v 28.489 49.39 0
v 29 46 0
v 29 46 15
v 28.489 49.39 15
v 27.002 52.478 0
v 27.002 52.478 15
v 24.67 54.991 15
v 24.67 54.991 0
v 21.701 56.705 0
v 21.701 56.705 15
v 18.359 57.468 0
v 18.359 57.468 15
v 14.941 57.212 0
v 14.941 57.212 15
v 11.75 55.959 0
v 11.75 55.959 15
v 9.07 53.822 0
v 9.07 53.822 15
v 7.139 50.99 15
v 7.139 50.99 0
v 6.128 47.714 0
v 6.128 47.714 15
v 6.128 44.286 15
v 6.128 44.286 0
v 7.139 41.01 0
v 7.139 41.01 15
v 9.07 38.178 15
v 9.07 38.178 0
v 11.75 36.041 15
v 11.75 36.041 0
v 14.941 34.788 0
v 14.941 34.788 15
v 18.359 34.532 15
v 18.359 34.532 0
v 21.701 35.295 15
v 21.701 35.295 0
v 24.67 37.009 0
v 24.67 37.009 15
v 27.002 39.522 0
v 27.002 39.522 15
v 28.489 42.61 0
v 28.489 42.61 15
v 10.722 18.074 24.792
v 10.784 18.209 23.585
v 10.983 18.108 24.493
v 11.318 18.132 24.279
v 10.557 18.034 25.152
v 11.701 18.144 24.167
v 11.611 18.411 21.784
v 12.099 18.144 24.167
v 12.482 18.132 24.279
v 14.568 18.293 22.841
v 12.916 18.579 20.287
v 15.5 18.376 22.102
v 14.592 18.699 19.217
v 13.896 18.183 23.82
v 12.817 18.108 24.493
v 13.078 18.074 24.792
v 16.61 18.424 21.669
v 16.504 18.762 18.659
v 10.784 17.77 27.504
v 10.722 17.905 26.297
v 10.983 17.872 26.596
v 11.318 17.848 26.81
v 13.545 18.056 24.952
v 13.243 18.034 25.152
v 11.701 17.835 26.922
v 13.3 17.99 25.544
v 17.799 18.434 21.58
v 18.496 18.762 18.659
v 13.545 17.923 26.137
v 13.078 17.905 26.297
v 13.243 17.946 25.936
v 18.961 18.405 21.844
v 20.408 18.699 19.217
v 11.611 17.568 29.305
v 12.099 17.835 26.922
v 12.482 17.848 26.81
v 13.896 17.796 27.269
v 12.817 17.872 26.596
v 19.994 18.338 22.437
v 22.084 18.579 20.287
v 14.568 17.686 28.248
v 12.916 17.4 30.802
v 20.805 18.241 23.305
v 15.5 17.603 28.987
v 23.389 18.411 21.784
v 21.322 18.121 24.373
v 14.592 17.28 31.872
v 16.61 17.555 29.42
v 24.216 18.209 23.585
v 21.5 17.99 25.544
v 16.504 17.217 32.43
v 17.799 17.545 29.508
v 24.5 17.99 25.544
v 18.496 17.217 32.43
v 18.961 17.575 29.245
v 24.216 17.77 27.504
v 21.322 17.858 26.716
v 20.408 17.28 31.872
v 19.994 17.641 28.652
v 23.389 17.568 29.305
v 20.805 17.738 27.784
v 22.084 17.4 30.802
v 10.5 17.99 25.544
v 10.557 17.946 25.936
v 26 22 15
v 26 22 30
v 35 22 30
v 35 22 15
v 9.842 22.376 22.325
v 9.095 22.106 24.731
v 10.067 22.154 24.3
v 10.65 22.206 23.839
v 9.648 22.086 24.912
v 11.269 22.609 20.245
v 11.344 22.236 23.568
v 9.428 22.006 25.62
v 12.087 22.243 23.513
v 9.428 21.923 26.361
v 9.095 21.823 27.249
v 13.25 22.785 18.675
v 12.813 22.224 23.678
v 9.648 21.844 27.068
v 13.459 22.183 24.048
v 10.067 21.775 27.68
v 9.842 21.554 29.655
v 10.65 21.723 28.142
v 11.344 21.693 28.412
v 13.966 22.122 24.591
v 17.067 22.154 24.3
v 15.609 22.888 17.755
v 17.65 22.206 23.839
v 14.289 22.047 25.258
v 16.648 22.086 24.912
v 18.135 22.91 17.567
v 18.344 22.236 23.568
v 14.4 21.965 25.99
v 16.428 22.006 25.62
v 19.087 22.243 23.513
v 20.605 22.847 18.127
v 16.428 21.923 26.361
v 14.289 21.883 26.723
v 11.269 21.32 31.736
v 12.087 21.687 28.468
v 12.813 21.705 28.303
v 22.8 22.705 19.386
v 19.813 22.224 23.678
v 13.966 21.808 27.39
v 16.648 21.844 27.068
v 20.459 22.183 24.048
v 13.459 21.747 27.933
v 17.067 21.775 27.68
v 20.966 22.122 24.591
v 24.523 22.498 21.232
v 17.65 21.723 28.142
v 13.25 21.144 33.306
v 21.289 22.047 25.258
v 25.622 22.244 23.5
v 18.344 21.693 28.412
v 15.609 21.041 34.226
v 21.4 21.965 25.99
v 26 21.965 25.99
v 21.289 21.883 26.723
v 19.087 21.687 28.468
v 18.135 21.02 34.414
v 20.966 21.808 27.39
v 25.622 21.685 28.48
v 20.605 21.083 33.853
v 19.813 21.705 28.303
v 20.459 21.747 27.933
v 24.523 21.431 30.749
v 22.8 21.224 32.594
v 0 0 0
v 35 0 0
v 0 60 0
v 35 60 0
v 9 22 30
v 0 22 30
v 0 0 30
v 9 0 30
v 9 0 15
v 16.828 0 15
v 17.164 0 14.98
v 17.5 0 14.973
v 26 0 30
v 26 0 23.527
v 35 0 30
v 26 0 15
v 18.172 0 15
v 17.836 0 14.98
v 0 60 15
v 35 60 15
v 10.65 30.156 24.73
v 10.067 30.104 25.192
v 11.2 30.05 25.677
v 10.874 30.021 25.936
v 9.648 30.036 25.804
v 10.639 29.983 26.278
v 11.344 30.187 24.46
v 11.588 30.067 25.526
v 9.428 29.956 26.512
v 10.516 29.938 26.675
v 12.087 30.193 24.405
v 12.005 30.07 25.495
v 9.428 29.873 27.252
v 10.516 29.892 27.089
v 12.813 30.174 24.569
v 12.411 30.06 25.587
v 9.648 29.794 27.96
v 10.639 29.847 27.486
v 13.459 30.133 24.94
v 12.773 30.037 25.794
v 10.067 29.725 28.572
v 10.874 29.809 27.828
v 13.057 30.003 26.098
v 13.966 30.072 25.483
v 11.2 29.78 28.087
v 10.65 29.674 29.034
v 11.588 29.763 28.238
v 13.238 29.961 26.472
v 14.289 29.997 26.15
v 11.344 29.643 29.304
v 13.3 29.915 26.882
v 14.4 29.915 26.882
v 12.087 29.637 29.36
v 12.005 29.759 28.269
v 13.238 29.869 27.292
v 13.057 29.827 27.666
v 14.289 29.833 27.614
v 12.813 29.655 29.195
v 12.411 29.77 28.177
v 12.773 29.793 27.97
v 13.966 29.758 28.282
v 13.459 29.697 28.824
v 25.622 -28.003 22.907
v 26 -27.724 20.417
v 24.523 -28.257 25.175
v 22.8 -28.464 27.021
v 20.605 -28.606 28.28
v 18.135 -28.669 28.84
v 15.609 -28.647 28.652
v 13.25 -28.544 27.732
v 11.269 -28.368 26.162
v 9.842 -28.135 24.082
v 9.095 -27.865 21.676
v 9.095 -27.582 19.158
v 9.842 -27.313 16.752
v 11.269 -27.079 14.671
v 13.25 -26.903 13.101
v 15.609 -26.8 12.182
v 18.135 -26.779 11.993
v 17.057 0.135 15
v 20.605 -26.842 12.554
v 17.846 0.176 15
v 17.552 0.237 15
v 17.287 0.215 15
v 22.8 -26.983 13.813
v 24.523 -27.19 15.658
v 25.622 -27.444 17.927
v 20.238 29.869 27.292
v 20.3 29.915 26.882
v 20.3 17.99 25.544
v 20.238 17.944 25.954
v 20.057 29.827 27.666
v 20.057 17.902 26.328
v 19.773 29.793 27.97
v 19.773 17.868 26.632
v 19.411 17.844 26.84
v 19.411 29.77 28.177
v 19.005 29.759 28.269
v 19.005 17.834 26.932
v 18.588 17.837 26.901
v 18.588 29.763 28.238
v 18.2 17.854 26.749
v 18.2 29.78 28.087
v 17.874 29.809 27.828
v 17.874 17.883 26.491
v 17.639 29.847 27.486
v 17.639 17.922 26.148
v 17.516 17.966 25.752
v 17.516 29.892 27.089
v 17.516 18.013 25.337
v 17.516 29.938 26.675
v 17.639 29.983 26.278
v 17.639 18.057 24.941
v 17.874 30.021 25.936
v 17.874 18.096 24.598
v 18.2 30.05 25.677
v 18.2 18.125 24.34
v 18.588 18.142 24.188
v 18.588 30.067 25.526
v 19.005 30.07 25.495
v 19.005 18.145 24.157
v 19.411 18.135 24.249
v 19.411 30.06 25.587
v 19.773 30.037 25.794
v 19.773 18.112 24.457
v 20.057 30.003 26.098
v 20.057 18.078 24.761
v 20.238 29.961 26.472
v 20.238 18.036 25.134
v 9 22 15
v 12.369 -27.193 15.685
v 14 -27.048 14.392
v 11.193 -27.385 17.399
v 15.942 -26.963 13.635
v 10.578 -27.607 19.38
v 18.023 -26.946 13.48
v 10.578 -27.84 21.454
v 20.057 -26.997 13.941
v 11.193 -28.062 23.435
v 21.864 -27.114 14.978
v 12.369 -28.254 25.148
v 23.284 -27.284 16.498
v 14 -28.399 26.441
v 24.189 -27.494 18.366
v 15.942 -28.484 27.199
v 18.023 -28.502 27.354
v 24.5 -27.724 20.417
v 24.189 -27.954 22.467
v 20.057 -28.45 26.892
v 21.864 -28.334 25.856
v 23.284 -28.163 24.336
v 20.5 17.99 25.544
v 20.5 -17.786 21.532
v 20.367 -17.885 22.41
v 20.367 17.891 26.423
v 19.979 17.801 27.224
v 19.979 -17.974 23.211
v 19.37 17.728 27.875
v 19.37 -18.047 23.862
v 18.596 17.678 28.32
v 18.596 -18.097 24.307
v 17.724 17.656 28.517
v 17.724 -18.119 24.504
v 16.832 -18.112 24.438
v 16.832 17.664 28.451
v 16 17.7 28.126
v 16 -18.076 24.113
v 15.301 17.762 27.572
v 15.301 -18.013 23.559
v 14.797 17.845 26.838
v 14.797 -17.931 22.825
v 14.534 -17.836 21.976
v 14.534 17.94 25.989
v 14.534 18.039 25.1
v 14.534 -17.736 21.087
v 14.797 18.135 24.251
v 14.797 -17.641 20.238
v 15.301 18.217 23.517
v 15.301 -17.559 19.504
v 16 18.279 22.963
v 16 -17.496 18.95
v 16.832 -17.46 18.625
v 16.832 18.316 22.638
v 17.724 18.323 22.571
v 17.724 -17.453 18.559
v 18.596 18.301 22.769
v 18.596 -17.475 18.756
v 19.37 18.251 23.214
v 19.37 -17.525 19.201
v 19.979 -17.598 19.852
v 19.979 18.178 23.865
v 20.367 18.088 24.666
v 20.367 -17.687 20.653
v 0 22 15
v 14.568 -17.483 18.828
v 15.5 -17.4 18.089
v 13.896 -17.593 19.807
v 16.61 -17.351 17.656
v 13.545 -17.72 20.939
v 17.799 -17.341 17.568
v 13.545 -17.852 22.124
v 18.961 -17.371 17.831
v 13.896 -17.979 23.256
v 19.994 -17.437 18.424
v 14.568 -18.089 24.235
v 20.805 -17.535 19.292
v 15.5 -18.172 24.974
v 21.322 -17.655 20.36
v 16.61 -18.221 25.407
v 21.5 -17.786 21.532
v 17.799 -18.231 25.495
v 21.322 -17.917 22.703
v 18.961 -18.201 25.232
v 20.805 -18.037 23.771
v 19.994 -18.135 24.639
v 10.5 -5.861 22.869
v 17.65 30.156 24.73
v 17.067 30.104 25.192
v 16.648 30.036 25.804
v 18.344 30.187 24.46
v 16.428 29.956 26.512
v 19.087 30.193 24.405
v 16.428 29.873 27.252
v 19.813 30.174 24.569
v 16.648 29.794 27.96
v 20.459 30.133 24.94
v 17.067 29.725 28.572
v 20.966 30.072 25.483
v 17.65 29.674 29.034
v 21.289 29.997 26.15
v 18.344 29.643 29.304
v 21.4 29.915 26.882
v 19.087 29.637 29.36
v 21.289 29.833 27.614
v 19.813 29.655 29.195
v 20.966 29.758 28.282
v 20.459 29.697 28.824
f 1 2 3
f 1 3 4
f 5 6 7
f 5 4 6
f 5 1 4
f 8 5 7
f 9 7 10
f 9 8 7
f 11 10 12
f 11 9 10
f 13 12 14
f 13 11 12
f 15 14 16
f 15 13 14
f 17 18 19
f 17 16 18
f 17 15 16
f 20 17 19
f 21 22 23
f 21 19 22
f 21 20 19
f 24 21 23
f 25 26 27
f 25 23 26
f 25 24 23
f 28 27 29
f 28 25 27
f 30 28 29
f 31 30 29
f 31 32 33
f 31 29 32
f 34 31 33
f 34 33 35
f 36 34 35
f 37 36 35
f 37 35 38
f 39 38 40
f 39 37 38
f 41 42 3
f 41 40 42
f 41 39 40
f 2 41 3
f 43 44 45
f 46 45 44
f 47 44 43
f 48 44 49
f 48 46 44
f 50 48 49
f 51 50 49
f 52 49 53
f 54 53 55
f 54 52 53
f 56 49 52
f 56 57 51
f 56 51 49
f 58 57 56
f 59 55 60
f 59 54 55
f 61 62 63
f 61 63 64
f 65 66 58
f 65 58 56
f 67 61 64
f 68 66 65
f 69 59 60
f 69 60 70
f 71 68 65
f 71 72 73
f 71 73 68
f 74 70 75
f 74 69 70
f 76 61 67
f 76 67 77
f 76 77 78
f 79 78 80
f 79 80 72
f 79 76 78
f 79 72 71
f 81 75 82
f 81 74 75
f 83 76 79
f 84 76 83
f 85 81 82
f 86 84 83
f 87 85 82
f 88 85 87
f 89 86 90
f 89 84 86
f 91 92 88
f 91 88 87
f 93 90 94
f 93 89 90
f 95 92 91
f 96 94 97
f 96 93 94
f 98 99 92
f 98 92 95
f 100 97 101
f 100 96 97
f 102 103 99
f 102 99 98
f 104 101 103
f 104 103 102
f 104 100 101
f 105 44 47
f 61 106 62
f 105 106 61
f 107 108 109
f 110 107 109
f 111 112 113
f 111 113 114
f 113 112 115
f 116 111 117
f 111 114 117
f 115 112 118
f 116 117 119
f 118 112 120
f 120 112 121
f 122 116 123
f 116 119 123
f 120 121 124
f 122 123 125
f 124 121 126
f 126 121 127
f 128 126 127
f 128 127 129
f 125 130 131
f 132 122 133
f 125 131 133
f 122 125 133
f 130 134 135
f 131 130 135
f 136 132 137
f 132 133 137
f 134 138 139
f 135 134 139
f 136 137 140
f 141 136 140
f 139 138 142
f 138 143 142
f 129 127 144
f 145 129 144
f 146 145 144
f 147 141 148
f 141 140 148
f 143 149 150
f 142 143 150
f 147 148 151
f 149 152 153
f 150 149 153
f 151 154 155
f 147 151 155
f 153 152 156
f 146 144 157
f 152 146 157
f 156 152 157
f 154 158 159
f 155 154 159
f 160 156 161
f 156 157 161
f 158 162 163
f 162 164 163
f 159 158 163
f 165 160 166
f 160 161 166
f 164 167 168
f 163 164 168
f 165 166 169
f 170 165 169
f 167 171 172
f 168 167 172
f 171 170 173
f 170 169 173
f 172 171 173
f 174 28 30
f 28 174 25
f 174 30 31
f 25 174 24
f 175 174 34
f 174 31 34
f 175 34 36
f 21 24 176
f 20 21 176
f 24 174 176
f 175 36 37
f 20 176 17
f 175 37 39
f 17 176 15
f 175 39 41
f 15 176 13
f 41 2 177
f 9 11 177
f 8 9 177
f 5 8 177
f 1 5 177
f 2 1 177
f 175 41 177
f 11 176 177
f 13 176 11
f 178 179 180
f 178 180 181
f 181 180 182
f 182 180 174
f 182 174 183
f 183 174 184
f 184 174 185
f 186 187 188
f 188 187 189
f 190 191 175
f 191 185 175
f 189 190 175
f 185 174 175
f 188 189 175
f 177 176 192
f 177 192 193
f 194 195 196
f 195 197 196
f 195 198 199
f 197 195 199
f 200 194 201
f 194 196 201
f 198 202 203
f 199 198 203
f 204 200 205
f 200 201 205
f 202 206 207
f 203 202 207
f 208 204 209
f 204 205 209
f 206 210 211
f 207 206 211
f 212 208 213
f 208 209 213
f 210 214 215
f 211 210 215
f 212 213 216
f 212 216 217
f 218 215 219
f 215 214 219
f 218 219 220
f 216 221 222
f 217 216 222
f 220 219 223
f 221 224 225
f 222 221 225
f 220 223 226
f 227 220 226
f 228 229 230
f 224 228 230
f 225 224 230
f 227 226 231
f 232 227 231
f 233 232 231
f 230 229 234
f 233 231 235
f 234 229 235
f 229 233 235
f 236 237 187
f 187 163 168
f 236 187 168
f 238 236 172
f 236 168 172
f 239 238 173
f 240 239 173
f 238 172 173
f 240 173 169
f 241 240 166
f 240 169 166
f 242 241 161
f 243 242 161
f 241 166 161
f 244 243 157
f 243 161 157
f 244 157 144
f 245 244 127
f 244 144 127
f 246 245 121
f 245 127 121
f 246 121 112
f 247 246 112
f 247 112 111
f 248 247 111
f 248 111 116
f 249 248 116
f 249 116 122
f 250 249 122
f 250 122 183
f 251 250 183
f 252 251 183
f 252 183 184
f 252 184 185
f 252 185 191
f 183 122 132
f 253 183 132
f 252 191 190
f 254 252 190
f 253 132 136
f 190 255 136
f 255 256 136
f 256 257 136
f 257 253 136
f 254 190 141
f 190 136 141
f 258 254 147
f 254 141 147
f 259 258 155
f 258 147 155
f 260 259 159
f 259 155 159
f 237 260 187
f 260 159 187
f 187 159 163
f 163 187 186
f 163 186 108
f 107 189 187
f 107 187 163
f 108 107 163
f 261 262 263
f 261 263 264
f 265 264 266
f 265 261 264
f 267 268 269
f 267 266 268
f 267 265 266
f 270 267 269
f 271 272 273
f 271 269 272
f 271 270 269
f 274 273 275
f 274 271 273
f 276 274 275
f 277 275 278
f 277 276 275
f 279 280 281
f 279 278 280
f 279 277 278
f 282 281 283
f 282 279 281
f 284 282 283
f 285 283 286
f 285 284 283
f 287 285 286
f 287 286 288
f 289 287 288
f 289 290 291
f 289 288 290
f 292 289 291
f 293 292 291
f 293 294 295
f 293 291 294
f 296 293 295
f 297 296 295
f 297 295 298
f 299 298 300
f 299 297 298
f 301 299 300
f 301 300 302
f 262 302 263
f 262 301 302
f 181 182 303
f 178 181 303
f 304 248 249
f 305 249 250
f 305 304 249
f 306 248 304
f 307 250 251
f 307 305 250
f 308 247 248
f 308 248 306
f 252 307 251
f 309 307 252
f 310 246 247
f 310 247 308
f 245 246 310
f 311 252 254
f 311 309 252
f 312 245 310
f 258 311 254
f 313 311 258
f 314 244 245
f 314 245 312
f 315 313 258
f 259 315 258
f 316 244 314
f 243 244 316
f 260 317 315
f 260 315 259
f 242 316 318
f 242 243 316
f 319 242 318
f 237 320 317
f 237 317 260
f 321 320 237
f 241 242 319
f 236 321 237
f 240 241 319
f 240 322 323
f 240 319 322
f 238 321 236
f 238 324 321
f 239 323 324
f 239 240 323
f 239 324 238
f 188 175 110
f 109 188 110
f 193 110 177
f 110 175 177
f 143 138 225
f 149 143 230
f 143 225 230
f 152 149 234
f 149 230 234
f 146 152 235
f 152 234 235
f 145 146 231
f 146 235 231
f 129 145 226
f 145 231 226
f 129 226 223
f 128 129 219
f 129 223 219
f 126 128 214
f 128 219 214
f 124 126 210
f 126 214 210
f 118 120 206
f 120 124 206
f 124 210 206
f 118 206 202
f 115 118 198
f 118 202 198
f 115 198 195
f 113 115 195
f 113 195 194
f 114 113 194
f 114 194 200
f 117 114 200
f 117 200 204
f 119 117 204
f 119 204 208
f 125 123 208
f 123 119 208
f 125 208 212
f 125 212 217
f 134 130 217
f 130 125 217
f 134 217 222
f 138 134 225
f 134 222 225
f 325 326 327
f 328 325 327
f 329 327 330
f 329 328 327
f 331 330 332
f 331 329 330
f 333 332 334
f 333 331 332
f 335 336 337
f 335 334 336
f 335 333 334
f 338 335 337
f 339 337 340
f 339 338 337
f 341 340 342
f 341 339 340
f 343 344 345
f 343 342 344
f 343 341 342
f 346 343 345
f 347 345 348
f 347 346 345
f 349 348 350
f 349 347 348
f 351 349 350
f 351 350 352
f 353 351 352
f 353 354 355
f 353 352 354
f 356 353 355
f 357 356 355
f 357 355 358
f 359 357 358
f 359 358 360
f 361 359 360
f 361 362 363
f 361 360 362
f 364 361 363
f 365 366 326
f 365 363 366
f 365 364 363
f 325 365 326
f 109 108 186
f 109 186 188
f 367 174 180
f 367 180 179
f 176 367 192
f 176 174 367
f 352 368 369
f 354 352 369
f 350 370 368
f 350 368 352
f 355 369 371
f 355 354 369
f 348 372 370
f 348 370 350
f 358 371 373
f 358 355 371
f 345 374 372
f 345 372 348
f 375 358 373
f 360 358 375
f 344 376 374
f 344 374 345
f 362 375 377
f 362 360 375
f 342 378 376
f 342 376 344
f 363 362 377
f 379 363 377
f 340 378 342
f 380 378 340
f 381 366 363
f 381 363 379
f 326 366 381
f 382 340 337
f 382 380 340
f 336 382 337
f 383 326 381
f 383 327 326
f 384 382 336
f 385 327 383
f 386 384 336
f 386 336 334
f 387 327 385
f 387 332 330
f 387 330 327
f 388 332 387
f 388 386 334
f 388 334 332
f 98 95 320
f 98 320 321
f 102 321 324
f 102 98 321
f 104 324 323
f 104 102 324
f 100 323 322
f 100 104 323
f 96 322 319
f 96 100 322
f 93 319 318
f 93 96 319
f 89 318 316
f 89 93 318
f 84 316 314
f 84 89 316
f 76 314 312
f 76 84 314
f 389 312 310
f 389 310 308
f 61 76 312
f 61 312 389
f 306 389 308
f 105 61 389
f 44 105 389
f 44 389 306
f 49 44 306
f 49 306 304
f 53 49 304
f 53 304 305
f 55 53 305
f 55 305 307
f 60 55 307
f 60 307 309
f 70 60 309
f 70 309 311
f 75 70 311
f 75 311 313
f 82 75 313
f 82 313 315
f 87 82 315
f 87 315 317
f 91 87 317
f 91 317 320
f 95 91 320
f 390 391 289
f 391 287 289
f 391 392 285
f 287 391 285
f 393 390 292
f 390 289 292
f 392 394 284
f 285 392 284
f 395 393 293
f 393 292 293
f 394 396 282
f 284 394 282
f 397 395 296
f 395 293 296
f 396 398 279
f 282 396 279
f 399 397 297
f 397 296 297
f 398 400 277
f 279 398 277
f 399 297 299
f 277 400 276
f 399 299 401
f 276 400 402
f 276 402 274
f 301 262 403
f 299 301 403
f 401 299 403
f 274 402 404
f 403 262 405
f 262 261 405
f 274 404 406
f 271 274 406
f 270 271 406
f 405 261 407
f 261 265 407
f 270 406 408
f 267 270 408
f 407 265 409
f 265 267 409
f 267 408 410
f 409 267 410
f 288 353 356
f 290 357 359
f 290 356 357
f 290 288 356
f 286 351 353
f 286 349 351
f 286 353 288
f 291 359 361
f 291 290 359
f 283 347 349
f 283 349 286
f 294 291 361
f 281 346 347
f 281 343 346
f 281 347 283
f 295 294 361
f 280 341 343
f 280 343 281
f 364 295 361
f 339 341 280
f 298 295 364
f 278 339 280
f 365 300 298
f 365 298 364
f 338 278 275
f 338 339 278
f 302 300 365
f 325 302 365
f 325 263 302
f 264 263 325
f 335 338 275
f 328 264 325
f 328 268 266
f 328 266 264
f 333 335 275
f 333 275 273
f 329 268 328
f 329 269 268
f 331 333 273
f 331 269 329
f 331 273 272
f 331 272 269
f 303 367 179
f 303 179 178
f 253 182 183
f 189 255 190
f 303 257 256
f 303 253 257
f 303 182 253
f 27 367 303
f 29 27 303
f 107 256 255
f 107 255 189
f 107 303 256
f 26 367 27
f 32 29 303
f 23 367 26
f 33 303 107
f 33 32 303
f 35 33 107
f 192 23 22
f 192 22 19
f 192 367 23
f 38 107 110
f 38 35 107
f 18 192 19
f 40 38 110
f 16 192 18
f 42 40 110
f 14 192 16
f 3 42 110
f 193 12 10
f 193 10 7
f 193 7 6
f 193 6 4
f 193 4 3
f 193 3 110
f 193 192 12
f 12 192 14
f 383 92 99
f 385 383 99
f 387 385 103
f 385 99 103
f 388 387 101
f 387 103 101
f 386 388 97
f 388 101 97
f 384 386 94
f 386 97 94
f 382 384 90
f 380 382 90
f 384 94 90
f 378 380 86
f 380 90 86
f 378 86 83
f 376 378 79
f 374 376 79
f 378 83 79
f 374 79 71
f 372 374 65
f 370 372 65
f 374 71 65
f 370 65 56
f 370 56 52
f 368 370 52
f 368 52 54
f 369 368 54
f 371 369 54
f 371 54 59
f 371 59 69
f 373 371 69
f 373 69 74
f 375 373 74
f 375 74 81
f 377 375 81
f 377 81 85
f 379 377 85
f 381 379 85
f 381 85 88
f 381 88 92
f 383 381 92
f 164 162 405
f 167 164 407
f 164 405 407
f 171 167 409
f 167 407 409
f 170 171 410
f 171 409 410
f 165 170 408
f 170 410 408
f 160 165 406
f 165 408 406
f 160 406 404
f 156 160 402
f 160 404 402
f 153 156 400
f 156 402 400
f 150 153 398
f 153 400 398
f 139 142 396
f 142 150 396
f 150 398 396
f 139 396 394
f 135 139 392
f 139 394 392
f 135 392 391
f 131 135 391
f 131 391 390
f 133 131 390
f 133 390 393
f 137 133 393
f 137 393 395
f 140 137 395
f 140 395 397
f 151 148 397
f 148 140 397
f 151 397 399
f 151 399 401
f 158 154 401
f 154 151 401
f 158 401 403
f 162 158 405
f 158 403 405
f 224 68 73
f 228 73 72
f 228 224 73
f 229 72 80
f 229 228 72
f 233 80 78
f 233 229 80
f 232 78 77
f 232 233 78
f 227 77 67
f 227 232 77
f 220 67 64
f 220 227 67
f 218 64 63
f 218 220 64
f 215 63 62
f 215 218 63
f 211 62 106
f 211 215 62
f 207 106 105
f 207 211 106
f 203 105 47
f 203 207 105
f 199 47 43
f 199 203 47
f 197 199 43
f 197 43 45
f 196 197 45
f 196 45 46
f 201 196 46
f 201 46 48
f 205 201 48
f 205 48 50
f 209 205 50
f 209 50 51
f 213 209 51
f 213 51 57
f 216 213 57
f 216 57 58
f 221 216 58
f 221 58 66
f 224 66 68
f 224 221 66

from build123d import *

# Parameters (mm, degrees)
CYLINDER010_R          = 11.5
CYLINDER010_DEPTH      = 20
BOX_W                  = 35
BOX_H                  = 60
BOX_DEPTH              = 15
BOX002_W               = 9
BOX002_H               = 22
BOX002_DEPTH           = 15
BOX001_W               = 9
BOX001_H               = 22
BOX001_DEPTH           = 15
CYLINDER009_R          = 1.4
CYLINDER009_DEPTH      = 50
CYLINDER008_R          = 2.5
CYLINDER008_DEPTH      = 12
CYLINDER007_R          = 1.4
CYLINDER007_DEPTH      = 50
CYLINDER006_R          = 2.5
CYLINDER006_DEPTH      = 12
CYLINDER005_R          = 3
CYLINDER005_DEPTH      = 60
CYLINDER004_R          = 4
CYLINDER004_DEPTH      = 40
CYLINDER002_R          = 7
CYLINDER002_DEPTH      = 46
CYLINDER_R             = 8.5
CYLINDER_DEPTH         = 50
CUT004_PLACEMENT_ANGLE = 6.4


with BuildPart() as cylinder010:
    # Cylinder010 → Cylinder010 (new body)
    with BuildSketch(Plane(origin=(17.5, 46, -2), x_dir=(1, 0, 0), z_dir=(0, 0, 1))):
        Circle(CYLINDER010_R)
    extrude(amount=CYLINDER010_DEPTH)


with BuildPart() as cut:
    # Box → Box (new body)
    with BuildSketch(Plane.XY):
        with Locations((17.5, 30)):
            Rectangle(BOX_W, BOX_H)
    extrude(amount=BOX_DEPTH)

    # Cut: cut Cylinder010
    add(cylinder010.part, mode=Mode.SUBTRACT)


with BuildPart() as cube002:
    # Box002 → Box002 (new body)
    with BuildSketch(Plane(origin=(26, 0, 15), x_dir=(1, 0, 0), z_dir=(0, 0, 1))):
        with Locations((4.5, 11)):
            Rectangle(BOX002_W, BOX002_H)
    extrude(amount=BOX002_DEPTH)


with BuildPart() as cube001:
    # Box001 → Box001 (new body)
    with BuildSketch(Plane.XY.offset(15)):
        with Locations((4.5, 11)):
            Rectangle(BOX001_W, BOX001_H)
    extrude(amount=BOX001_DEPTH)


with BuildPart() as cylinder009:
    # Cylinder009 → Cylinder009 (new body)
    with BuildSketch(Plane(origin=(11.9, 44, 26), x_dir=(1, 0, 0), z_dir=(0, -1, 0))):
        Circle(CYLINDER009_R)
    extrude(amount=CYLINDER009_DEPTH)


with BuildPart() as cylinder008:
    # Cylinder008 → Cylinder008 (new body)
    with BuildSketch(Plane(origin=(11.9, 30, 26), x_dir=(1, 0, 0), z_dir=(0, -1, 0))):
        Circle(CYLINDER008_R)
    extrude(amount=CYLINDER008_DEPTH)


with BuildPart() as cylinder007:
    # Cylinder007 → Cylinder007 (new body)
    with BuildSketch(Plane(origin=(18.9, 45, 26), x_dir=(1, 0, 0), z_dir=(0, -1, 0))):
        Circle(CYLINDER007_R)
    extrude(amount=CYLINDER007_DEPTH)


with BuildPart() as cylinder006:
    # Cylinder006 → Cylinder006 (new body)
    with BuildSketch(Plane(origin=(18.9, 30, 26), x_dir=(1, 0, 0), z_dir=(0, -1, 0))):
        Circle(CYLINDER006_R)
    extrude(amount=CYLINDER006_DEPTH)


with BuildPart() as cylinder005:
    # Cylinder005 → Cylinder005 (new body)
    with BuildSketch(Plane(origin=(17.5, 18, 26), x_dir=(1, 0, 0), z_dir=(0, -1, 0))):
        Circle(CYLINDER005_R)
    extrude(amount=CYLINDER005_DEPTH)


with BuildPart() as cut002:
    # Cylinder004 → Cylinder004 (new body)
    with BuildSketch(Plane(origin=(17.5, 22, 26), x_dir=(1, 0, 0), z_dir=(0, -1, 0))):
        Circle(CYLINDER004_R)
    extrude(amount=CYLINDER004_DEPTH)

    # Cut002: cut Cylinder005
    add(cylinder005.part, mode=Mode.SUBTRACT)


with BuildPart() as cylinder002:
    # Cylinder002 → Cylinder002 (new body)
    with BuildSketch(Plane(origin=(17.5, 18, 26), x_dir=(1, 0, 0), z_dir=(0, -1, 0))):
        Circle(CYLINDER002_R)
    extrude(amount=CYLINDER002_DEPTH)


with BuildPart() as fusion004:
    # Cylinder → Cylinder (new body)
    with BuildSketch(Plane(origin=(17.5, 22, 26), x_dir=(1, 0, 0), z_dir=(0, -1, 0))):
        Circle(CYLINDER_R)
    extrude(amount=CYLINDER_DEPTH)

    # Cut001: cut Cylinder002
    add(cylinder002.part, mode=Mode.SUBTRACT)

    # Fusion: union Cut002
    add(cut002.part)

    # Fusion001: union Cylinder006
    add(cylinder006.part)

    # Cut003: cut Cylinder007
    add(cylinder007.part, mode=Mode.SUBTRACT)

    # Fusion002: union Cylinder008
    add(cylinder008.part)

    # Cut004: cut Cylinder009
    add(cylinder009.part, mode=Mode.SUBTRACT)


with BuildPart() as fusion004_1:
    # Cut004 placement: moved
    add(fusion004.part.moved(Location((0, 3, -2.3))).rotate(Axis((0, 3, -2.3), (1, 0, 0)), CUT004_PLACEMENT_ANGLE))

    # Fusion003: union Cube002, Cube001
    add(cube002.part)
    add(cube001.part)

    # Fusion004: union Cut
    add(cut.part)


solid = fusion004_1.part
